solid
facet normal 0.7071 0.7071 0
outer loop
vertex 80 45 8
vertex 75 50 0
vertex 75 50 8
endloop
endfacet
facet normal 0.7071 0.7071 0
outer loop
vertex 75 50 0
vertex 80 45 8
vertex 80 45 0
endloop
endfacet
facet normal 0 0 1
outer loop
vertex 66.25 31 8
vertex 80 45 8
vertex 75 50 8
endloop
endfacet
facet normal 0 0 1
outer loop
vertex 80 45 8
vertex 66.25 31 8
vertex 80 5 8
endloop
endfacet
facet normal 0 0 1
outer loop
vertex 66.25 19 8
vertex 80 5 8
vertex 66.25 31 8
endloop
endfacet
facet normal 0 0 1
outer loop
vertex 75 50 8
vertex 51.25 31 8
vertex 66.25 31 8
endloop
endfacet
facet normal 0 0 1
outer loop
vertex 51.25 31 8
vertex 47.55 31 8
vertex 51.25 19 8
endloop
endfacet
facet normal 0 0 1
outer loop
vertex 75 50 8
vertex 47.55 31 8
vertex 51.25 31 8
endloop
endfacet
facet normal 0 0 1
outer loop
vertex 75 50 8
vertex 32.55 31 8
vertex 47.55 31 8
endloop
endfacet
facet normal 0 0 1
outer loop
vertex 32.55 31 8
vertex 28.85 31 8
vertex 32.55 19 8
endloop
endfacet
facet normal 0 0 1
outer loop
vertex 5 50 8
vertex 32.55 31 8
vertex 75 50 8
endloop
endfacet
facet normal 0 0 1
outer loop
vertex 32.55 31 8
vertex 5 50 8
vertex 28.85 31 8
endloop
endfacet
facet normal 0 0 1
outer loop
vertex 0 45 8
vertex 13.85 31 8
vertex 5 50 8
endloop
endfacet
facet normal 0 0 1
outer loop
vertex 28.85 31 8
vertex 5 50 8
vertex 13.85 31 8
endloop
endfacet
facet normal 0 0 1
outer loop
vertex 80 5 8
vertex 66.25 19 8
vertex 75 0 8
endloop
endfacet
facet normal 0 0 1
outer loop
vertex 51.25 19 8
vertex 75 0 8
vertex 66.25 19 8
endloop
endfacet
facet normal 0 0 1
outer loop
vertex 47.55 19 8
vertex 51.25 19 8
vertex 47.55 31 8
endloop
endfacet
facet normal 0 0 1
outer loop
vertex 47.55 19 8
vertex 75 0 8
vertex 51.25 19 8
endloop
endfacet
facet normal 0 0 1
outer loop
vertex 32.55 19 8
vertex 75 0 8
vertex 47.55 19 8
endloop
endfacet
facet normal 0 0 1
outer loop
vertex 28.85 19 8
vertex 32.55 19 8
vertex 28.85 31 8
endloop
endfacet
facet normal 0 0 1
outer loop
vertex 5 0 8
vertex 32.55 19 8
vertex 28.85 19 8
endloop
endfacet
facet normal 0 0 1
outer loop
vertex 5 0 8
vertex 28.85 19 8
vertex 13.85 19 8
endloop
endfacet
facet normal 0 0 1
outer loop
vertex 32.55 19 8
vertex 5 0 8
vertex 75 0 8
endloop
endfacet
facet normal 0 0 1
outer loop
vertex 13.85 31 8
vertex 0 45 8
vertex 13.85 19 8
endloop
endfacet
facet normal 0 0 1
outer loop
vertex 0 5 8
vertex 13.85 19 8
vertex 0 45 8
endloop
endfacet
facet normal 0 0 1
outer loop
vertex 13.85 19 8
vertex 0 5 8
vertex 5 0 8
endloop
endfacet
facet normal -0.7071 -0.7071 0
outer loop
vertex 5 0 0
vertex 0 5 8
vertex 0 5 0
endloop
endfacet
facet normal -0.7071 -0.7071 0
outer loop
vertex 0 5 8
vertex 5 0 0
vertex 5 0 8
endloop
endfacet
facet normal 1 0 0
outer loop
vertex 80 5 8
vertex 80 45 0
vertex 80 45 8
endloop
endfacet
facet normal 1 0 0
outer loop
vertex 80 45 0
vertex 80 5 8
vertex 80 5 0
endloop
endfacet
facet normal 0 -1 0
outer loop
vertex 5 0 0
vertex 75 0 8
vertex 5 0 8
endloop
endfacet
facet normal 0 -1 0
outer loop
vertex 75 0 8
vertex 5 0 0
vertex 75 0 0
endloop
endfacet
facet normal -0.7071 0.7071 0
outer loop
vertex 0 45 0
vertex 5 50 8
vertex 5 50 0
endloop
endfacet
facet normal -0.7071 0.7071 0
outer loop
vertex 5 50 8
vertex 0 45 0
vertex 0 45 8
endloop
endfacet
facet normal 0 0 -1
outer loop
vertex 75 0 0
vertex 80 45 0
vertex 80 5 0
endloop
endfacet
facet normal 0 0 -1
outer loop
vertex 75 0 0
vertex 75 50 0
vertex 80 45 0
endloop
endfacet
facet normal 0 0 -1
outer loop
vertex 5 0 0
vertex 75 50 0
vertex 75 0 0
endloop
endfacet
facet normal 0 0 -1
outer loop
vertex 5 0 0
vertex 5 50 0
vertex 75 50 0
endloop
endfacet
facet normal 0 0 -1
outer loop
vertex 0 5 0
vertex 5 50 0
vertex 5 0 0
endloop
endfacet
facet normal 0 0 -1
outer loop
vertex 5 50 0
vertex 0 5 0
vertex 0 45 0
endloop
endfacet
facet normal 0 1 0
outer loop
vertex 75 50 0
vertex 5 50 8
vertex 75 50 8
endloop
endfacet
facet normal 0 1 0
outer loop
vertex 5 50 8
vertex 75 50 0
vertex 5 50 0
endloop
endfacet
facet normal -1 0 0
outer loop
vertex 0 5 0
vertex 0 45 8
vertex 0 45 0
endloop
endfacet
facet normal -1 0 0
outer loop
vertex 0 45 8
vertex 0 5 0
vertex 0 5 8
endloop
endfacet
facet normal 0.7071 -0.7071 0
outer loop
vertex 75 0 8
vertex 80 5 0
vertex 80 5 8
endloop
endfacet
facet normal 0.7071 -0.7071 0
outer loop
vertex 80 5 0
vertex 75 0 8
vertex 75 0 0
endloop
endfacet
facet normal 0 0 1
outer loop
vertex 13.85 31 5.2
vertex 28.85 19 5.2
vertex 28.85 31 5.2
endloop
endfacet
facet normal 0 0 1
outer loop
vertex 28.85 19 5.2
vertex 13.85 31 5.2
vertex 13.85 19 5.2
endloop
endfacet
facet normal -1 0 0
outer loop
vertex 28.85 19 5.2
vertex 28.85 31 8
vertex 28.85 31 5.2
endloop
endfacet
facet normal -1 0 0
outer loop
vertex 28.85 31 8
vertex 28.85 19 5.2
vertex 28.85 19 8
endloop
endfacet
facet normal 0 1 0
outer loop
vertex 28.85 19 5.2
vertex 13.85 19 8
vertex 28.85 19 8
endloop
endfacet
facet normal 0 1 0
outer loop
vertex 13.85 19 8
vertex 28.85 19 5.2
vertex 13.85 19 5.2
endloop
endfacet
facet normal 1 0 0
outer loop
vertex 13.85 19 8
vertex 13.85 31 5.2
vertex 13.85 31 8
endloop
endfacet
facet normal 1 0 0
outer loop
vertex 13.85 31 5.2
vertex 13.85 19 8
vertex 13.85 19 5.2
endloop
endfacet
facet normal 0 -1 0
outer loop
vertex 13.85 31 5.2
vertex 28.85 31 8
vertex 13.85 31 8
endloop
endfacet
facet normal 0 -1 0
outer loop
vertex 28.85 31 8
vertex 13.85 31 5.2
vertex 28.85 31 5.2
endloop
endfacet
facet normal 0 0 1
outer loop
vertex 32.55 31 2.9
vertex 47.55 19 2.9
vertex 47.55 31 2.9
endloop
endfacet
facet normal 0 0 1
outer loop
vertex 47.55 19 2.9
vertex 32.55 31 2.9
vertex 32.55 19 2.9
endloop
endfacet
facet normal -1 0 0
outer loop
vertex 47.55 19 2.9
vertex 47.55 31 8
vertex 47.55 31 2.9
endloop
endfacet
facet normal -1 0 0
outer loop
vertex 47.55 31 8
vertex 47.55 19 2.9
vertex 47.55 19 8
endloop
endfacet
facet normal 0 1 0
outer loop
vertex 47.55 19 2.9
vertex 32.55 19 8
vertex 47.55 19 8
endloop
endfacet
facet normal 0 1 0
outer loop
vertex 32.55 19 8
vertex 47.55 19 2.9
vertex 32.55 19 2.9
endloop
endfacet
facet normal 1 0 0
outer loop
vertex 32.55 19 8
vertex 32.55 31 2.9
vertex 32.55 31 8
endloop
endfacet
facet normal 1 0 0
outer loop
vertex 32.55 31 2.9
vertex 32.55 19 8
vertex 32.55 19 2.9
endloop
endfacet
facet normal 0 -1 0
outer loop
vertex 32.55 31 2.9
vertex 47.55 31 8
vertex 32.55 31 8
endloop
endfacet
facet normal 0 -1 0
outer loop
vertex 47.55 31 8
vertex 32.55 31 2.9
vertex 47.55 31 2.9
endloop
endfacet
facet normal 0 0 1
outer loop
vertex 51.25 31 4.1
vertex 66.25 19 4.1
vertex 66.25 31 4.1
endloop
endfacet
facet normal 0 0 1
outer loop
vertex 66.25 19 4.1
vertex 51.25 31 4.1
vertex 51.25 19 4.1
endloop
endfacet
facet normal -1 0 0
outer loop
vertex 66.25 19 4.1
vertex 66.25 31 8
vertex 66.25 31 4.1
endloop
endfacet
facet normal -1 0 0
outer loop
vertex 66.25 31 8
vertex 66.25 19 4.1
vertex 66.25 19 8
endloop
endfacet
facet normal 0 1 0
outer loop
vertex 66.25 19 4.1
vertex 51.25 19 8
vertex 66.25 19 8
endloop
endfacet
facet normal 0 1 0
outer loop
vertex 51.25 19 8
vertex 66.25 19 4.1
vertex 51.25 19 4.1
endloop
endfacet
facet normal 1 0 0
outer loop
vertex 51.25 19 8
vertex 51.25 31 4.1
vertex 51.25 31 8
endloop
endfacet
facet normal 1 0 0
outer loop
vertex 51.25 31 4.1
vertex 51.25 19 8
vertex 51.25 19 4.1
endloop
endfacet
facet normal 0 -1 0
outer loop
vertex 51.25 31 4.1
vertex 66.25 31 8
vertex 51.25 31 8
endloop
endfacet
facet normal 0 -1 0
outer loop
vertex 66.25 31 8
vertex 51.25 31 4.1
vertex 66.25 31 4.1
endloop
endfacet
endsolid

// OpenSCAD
$fn = 32;

// ----------------------------------------------------------------------
// Windowed plate: 3 voids, 80 x 50 x 8 mm
// ----------------------------------------------------------------------

// --- parameters (mm) ---
plate_l = 80;             // plate length, X
plate_w = 50;             // plate width, Y
plate_t = 8;              // plate thickness, Z
edge_margin = 12;         // wall from the plate edge to any window
windows = 3;              // number of windows in the row
win_l = 15;               // window length
win_w = 12;               // window width
win_pitch = 18.7;         // window pitch along X
depth_1 = 2.8;            // depth of void 1 (full thickness = through)
depth_2 = 5.1;            // depth of void 2 (full thickness = through)
depth_3 = 3.9;            // depth of void 3 (full thickness = through)
corner_c = 5;             // corner chamfer of the plate

profile = [[5, 0], [75, 0], [80, 5], [80, 45], [75, 50], [5, 50], [0, 45], [0, 5]];  // primary outline, 8 points, counter clockwise
void_1 = [[13.85, 19], [28.85, 19], [28.85, 31], [13.85, 31]];  // window 1 of the row, 4 points
void_2 = [[32.55, 19], [47.55, 19], [47.55, 31], [32.55, 31]];  // window 2 of the row, 4 points
void_3 = [[51.25, 19], [66.25, 19], [66.25, 31], [51.25, 31]];  // window 3 of the row, 4 points

// --- the one profile operation ---
difference() {
  linear_extrude(height = plate_t) polygon(points = profile);
  translate([0, 0, plate_t - depth_1])
    linear_extrude(height = depth_1 + 1) polygon(points = void_1);
  translate([0, 0, plate_t - depth_2])
    linear_extrude(height = depth_2 + 1) polygon(points = void_2);
  translate([0, 0, plate_t - depth_3])
    linear_extrude(height = depth_3 + 1) polygon(points = void_3);
}
